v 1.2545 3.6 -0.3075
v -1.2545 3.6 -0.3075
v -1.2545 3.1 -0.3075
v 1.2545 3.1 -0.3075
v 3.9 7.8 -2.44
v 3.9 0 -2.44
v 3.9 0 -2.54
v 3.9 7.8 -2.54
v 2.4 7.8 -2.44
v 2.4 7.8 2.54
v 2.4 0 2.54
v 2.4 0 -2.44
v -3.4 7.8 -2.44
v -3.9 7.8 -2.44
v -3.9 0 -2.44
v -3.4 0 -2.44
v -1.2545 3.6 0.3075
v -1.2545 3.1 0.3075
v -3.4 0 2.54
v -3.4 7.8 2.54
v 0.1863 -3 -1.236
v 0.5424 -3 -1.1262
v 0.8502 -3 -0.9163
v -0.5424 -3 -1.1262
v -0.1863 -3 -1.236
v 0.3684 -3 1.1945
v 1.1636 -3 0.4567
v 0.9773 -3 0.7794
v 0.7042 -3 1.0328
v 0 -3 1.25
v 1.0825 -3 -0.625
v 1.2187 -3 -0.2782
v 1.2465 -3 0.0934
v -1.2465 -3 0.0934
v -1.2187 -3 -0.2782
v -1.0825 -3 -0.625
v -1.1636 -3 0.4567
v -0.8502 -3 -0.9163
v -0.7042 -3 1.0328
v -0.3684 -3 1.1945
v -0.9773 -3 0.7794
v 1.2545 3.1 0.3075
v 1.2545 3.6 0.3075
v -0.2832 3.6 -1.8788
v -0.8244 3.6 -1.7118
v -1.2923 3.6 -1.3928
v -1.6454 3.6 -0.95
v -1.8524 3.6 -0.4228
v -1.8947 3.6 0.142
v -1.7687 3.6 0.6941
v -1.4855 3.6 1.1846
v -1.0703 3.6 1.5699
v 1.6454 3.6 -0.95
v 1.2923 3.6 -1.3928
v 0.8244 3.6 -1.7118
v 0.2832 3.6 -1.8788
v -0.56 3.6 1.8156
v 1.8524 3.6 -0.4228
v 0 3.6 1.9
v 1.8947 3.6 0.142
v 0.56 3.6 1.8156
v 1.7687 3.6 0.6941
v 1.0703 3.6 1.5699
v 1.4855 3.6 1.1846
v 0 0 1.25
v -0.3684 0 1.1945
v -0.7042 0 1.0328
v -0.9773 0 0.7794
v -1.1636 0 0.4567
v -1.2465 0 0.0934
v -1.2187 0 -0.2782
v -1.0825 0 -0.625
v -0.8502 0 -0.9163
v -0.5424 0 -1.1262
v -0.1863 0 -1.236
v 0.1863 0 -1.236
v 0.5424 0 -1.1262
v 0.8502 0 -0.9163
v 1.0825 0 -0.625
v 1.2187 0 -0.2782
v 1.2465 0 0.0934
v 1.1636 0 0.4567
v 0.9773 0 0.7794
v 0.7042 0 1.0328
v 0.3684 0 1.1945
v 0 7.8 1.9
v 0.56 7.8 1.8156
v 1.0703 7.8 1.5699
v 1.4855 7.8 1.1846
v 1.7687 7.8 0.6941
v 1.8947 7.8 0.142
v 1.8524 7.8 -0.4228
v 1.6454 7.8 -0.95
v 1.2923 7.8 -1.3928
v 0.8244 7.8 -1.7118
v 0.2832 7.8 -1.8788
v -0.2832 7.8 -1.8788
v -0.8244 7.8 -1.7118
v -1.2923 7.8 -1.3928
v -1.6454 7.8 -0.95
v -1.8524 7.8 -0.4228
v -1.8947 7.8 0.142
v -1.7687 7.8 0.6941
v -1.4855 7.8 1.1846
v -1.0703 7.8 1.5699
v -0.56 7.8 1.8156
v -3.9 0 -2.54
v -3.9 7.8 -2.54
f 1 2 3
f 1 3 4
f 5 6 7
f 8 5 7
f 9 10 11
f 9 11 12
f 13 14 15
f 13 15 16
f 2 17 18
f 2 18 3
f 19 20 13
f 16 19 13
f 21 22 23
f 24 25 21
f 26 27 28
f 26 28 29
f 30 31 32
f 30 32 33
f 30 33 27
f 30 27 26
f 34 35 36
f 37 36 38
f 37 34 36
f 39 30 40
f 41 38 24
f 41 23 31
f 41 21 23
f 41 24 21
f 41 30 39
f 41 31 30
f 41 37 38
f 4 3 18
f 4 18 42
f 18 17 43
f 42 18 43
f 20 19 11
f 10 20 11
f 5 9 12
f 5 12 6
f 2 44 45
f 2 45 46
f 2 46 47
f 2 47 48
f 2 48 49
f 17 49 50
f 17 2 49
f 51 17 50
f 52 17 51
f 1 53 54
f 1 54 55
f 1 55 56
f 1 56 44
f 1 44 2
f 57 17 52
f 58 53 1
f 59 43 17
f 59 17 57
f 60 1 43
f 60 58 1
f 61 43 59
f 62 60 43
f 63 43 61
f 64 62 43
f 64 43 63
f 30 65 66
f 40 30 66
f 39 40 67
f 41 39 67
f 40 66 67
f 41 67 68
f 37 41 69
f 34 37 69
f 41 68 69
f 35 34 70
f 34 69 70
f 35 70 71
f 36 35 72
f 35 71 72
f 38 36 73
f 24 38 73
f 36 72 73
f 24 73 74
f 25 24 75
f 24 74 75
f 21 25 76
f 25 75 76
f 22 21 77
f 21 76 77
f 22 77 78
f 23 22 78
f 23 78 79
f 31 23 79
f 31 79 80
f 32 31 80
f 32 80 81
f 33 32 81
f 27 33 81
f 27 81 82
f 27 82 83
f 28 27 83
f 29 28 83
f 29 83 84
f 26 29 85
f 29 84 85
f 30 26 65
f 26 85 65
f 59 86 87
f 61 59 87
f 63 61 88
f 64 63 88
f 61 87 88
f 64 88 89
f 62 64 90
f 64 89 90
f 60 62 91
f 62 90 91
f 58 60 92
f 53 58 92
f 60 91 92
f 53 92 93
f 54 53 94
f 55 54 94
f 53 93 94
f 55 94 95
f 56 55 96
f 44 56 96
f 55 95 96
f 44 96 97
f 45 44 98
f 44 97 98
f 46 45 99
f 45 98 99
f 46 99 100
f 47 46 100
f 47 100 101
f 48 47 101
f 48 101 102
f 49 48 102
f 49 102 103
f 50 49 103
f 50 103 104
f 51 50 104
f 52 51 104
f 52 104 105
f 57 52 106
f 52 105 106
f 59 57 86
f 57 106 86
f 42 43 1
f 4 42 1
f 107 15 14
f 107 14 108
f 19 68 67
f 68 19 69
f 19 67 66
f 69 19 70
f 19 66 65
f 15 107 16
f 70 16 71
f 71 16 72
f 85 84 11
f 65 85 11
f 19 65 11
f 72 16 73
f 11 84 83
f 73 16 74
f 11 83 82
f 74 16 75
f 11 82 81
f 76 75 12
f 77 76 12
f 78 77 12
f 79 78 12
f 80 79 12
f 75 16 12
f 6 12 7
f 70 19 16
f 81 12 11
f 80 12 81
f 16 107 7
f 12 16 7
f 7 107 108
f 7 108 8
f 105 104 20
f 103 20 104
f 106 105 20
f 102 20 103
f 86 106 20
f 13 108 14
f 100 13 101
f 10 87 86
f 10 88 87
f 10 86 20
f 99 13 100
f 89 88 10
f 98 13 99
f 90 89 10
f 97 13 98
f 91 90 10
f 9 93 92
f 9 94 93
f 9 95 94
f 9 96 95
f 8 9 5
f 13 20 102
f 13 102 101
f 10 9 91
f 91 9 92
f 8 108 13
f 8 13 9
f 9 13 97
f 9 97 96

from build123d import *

# Parameters (mm, degrees)
SKETCH_1_W          = 7.8
SKETCH_1_H          = 5.08
EXTRUDE_1_DEPTH     = 7.8
SKETCH_2_R          = 1.9
CUT_EXTRUDE_1_DEPTH = 4.2
SKETCH_3_W          = 2.509058382
SKETCH_3_H          = 0.614954654
CUT_EXTRUDE_2_DEPTH = 0.5
SKETCH_4_R          = 1.25
EXTRUDE_1_2_DEPTH   = 3
SKETCH_5_W          = 0.5
SKETCH_5_H          = 4.98
SKETCH_5_W_2        = 1.5
CUT_EXTRUDE_3_DEPTH = 12.760170067


with BuildPart() as part:
    # 草图1 → Extrude 1 (new body)
    with BuildSketch(Plane(origin=(0, 0, 0), x_dir=(1, 0, 0), z_dir=(0, 1, 0))):
        Rectangle(SKETCH_1_W, SKETCH_1_H)
    extrude(amount=EXTRUDE_1_DEPTH)

    # 草图2 → 切除-拉伸1 (cut)
    with BuildSketch(Plane(origin=(0, 7.8, 0), x_dir=(1, 0, 0), z_dir=(0, 1, 0))):
        with Locations(Location((0, 0, 0), (0, 0, 270))):
            Circle(SKETCH_2_R)
    extrude(amount=-CUT_EXTRUDE_1_DEPTH, mode=Mode.SUBTRACT)

    # 草图3 → 切除-拉伸2 (cut)
    with BuildSketch(Plane(origin=(0, 3.6, 0), x_dir=(1, 0, 0), z_dir=(0, 1, 0))):
        Rectangle(SKETCH_3_W, SKETCH_3_H)
    extrude(amount=-CUT_EXTRUDE_2_DEPTH, mode=Mode.SUBTRACT)

    # 草图4 → Extrude 1 2 (add)
    with BuildSketch(Plane.XZ):
        with Locations(Location((0, 0, 0), (0, 0, 90))):
            Circle(SKETCH_4_R)
    extrude(amount=EXTRUDE_1_2_DEPTH)

    # 草图5 → 切除-拉伸3 (cut, through all)
    with BuildSketch(Plane(origin=(0, 7.8, 0), x_dir=(1, 0, 0), z_dir=(0, 1, 0))):
        with Locations((-3.65, -0.05)):
            Rectangle(SKETCH_5_W, SKETCH_5_H)
        with Locations((3.15, -0.05)):
            Rectangle(SKETCH_5_W_2, SKETCH_5_H)
    extrude(amount=-CUT_EXTRUDE_3_DEPTH, mode=Mode.SUBTRACT)


solid = part.part
